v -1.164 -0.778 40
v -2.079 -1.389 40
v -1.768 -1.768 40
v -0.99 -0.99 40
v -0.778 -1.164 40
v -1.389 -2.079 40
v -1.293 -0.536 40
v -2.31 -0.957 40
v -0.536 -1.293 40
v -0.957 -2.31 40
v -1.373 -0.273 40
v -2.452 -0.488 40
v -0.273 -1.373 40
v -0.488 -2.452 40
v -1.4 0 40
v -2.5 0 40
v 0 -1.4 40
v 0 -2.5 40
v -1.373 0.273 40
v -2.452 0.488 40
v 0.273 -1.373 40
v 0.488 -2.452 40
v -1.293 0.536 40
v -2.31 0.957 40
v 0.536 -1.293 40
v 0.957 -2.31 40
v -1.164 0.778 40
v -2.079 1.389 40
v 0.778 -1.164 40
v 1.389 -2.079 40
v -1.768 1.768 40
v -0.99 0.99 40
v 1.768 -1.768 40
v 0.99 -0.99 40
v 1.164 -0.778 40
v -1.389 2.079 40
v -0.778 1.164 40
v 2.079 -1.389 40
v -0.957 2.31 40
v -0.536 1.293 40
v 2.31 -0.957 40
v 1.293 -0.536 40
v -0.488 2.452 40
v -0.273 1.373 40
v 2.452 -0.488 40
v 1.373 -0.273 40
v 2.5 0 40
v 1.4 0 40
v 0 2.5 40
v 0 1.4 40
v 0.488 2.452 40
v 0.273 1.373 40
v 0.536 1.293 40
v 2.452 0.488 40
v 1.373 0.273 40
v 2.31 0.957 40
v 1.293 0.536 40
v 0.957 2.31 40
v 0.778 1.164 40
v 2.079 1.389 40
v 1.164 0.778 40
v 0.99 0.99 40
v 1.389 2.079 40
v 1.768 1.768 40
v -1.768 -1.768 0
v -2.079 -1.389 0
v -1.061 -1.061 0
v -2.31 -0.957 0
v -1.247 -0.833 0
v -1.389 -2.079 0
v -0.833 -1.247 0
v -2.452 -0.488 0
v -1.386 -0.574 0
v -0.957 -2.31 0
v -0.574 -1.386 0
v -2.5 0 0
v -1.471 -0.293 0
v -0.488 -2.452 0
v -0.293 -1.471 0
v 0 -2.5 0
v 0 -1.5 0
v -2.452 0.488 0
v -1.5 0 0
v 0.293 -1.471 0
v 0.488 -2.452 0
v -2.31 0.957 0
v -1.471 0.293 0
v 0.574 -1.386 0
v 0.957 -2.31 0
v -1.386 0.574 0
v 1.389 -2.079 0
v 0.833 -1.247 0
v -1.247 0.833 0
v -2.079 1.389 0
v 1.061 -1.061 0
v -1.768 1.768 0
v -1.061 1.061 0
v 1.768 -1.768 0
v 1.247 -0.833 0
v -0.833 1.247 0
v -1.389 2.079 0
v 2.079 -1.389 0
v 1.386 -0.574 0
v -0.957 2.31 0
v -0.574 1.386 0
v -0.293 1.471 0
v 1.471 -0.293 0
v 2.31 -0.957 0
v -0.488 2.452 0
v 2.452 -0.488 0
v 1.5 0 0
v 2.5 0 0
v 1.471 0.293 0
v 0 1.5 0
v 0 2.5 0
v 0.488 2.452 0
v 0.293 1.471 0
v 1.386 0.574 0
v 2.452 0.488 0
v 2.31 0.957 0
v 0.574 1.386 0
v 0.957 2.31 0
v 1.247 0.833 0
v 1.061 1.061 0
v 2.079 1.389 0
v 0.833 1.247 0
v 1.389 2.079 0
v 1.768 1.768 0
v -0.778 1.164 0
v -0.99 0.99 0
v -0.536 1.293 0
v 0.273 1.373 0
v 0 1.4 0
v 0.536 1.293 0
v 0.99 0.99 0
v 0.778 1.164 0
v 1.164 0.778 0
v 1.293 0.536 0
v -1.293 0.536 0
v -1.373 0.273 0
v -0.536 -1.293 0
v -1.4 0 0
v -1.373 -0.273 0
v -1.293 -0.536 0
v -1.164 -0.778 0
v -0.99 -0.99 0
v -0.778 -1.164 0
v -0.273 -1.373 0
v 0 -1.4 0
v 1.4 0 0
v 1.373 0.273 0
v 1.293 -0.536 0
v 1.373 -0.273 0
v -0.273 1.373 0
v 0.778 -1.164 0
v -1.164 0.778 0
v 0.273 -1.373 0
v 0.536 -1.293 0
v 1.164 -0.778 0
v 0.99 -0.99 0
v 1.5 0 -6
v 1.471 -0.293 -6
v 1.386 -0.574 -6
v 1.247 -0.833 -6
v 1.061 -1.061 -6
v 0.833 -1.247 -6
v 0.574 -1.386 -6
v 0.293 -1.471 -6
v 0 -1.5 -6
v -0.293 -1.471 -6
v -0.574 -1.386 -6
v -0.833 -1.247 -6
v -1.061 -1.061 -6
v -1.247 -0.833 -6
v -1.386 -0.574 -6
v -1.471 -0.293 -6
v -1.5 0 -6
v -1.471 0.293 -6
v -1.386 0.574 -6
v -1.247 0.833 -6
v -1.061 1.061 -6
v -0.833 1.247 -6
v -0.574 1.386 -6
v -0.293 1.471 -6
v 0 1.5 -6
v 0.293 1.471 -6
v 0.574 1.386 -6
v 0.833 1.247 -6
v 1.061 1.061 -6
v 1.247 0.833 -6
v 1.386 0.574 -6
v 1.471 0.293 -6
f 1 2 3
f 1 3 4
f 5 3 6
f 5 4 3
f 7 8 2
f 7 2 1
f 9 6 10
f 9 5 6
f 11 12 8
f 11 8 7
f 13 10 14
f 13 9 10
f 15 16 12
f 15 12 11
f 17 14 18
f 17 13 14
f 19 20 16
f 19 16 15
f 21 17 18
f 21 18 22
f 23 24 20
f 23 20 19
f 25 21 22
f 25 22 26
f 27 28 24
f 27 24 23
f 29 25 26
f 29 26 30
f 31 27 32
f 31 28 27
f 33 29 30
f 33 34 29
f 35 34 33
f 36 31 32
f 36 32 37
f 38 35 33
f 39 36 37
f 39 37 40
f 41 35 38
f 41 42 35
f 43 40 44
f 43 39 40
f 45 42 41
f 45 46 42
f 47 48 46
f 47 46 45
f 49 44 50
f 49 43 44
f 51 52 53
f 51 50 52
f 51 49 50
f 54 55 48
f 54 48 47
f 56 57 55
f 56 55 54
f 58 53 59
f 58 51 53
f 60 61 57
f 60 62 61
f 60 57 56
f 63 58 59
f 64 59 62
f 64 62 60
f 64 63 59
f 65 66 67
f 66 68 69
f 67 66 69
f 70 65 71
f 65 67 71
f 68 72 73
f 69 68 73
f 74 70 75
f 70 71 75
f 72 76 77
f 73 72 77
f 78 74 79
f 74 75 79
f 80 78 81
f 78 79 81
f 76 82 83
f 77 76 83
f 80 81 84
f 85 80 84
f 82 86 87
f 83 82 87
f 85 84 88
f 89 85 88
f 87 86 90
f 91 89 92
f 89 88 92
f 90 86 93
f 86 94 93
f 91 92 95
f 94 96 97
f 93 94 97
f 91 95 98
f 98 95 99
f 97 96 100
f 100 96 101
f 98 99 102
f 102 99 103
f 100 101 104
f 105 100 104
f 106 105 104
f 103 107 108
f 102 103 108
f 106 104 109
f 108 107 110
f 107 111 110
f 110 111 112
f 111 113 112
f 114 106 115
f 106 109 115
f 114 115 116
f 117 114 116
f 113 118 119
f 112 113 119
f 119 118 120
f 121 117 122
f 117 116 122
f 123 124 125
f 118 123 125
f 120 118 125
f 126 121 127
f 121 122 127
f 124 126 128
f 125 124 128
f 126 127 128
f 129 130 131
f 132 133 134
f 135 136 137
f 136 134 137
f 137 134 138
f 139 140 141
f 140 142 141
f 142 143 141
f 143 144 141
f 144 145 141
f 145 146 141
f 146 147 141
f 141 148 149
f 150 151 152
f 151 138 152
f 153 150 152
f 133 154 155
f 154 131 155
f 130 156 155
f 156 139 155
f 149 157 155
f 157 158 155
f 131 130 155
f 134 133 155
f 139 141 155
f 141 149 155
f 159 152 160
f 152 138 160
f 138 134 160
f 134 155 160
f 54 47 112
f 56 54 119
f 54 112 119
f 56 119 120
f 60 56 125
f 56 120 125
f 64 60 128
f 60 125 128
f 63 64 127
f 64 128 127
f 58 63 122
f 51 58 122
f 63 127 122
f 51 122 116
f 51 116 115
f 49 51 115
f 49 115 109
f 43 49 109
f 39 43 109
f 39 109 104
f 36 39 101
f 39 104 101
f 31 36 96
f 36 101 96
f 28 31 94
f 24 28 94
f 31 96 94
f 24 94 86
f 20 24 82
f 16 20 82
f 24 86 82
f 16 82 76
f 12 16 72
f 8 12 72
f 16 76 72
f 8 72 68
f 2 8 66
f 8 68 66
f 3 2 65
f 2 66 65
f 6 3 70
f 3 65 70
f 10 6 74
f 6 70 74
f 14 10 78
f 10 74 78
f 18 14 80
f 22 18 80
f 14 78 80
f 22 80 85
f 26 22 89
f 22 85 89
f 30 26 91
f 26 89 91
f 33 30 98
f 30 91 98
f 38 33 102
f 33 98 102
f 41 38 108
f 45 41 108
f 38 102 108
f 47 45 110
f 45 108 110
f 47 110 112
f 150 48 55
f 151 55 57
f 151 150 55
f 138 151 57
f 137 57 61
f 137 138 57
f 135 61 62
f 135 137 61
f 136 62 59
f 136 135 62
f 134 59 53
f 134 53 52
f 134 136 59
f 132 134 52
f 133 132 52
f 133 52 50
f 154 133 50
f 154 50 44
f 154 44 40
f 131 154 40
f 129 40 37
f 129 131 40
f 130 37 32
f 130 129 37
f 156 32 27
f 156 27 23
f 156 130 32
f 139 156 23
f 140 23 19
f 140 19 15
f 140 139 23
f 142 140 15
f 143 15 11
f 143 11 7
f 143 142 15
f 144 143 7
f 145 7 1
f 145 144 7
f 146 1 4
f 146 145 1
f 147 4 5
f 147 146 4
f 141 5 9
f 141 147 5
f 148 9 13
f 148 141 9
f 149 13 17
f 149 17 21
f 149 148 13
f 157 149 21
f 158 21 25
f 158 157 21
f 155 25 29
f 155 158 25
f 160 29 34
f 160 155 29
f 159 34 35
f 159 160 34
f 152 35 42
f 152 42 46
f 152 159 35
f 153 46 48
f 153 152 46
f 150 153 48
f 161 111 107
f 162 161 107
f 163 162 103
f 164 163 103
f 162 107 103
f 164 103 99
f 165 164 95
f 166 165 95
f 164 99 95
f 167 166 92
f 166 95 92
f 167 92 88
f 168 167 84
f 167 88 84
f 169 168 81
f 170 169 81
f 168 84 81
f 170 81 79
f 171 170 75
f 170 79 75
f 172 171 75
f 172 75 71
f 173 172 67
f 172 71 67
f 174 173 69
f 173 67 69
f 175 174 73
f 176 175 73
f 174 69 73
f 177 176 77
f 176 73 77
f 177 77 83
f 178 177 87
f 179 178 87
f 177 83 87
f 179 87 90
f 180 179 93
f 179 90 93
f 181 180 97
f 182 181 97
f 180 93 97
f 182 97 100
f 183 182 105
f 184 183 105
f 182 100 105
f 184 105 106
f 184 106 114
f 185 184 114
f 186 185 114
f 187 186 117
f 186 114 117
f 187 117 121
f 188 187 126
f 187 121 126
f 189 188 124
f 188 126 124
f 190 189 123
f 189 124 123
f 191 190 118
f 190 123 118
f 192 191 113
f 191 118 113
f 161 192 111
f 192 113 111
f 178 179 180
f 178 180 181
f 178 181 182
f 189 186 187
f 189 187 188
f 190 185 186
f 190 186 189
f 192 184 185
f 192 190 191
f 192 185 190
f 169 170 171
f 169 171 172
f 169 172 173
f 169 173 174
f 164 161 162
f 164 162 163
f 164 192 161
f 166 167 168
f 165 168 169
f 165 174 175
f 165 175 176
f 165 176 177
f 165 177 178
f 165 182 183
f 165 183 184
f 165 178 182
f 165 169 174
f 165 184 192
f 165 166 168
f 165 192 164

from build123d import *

# Parameters (mm, degrees)
SKETCH_1_R      = 2.5
SKETCH_1_R_2    = 1.4
EXTRUDE_1_DEPTH = 40
SKETCH_2_R      = 1.5
EXTRUDE_2_DEPTH = 6


with BuildPart() as part:
    # 草图1 → 凸台-拉伸1 (new body)
    with BuildSketch(Plane.XY):
        Circle(SKETCH_1_R)
        Circle(SKETCH_1_R_2, mode=Mode.SUBTRACT)
    extrude(amount=EXTRUDE_1_DEPTH)

    # 草图2 → 凸台-拉伸2 (add)
    with BuildSketch(Plane(origin=(0, 0, 0), x_dir=(-1, 0, 0), z_dir=(0, 0, -1))):
        with Locations(Location((0, 0, 0), (0, 0, 180))):
            Circle(SKETCH_2_R)
    extrude(amount=EXTRUDE_2_DEPTH)


solid = part.part
